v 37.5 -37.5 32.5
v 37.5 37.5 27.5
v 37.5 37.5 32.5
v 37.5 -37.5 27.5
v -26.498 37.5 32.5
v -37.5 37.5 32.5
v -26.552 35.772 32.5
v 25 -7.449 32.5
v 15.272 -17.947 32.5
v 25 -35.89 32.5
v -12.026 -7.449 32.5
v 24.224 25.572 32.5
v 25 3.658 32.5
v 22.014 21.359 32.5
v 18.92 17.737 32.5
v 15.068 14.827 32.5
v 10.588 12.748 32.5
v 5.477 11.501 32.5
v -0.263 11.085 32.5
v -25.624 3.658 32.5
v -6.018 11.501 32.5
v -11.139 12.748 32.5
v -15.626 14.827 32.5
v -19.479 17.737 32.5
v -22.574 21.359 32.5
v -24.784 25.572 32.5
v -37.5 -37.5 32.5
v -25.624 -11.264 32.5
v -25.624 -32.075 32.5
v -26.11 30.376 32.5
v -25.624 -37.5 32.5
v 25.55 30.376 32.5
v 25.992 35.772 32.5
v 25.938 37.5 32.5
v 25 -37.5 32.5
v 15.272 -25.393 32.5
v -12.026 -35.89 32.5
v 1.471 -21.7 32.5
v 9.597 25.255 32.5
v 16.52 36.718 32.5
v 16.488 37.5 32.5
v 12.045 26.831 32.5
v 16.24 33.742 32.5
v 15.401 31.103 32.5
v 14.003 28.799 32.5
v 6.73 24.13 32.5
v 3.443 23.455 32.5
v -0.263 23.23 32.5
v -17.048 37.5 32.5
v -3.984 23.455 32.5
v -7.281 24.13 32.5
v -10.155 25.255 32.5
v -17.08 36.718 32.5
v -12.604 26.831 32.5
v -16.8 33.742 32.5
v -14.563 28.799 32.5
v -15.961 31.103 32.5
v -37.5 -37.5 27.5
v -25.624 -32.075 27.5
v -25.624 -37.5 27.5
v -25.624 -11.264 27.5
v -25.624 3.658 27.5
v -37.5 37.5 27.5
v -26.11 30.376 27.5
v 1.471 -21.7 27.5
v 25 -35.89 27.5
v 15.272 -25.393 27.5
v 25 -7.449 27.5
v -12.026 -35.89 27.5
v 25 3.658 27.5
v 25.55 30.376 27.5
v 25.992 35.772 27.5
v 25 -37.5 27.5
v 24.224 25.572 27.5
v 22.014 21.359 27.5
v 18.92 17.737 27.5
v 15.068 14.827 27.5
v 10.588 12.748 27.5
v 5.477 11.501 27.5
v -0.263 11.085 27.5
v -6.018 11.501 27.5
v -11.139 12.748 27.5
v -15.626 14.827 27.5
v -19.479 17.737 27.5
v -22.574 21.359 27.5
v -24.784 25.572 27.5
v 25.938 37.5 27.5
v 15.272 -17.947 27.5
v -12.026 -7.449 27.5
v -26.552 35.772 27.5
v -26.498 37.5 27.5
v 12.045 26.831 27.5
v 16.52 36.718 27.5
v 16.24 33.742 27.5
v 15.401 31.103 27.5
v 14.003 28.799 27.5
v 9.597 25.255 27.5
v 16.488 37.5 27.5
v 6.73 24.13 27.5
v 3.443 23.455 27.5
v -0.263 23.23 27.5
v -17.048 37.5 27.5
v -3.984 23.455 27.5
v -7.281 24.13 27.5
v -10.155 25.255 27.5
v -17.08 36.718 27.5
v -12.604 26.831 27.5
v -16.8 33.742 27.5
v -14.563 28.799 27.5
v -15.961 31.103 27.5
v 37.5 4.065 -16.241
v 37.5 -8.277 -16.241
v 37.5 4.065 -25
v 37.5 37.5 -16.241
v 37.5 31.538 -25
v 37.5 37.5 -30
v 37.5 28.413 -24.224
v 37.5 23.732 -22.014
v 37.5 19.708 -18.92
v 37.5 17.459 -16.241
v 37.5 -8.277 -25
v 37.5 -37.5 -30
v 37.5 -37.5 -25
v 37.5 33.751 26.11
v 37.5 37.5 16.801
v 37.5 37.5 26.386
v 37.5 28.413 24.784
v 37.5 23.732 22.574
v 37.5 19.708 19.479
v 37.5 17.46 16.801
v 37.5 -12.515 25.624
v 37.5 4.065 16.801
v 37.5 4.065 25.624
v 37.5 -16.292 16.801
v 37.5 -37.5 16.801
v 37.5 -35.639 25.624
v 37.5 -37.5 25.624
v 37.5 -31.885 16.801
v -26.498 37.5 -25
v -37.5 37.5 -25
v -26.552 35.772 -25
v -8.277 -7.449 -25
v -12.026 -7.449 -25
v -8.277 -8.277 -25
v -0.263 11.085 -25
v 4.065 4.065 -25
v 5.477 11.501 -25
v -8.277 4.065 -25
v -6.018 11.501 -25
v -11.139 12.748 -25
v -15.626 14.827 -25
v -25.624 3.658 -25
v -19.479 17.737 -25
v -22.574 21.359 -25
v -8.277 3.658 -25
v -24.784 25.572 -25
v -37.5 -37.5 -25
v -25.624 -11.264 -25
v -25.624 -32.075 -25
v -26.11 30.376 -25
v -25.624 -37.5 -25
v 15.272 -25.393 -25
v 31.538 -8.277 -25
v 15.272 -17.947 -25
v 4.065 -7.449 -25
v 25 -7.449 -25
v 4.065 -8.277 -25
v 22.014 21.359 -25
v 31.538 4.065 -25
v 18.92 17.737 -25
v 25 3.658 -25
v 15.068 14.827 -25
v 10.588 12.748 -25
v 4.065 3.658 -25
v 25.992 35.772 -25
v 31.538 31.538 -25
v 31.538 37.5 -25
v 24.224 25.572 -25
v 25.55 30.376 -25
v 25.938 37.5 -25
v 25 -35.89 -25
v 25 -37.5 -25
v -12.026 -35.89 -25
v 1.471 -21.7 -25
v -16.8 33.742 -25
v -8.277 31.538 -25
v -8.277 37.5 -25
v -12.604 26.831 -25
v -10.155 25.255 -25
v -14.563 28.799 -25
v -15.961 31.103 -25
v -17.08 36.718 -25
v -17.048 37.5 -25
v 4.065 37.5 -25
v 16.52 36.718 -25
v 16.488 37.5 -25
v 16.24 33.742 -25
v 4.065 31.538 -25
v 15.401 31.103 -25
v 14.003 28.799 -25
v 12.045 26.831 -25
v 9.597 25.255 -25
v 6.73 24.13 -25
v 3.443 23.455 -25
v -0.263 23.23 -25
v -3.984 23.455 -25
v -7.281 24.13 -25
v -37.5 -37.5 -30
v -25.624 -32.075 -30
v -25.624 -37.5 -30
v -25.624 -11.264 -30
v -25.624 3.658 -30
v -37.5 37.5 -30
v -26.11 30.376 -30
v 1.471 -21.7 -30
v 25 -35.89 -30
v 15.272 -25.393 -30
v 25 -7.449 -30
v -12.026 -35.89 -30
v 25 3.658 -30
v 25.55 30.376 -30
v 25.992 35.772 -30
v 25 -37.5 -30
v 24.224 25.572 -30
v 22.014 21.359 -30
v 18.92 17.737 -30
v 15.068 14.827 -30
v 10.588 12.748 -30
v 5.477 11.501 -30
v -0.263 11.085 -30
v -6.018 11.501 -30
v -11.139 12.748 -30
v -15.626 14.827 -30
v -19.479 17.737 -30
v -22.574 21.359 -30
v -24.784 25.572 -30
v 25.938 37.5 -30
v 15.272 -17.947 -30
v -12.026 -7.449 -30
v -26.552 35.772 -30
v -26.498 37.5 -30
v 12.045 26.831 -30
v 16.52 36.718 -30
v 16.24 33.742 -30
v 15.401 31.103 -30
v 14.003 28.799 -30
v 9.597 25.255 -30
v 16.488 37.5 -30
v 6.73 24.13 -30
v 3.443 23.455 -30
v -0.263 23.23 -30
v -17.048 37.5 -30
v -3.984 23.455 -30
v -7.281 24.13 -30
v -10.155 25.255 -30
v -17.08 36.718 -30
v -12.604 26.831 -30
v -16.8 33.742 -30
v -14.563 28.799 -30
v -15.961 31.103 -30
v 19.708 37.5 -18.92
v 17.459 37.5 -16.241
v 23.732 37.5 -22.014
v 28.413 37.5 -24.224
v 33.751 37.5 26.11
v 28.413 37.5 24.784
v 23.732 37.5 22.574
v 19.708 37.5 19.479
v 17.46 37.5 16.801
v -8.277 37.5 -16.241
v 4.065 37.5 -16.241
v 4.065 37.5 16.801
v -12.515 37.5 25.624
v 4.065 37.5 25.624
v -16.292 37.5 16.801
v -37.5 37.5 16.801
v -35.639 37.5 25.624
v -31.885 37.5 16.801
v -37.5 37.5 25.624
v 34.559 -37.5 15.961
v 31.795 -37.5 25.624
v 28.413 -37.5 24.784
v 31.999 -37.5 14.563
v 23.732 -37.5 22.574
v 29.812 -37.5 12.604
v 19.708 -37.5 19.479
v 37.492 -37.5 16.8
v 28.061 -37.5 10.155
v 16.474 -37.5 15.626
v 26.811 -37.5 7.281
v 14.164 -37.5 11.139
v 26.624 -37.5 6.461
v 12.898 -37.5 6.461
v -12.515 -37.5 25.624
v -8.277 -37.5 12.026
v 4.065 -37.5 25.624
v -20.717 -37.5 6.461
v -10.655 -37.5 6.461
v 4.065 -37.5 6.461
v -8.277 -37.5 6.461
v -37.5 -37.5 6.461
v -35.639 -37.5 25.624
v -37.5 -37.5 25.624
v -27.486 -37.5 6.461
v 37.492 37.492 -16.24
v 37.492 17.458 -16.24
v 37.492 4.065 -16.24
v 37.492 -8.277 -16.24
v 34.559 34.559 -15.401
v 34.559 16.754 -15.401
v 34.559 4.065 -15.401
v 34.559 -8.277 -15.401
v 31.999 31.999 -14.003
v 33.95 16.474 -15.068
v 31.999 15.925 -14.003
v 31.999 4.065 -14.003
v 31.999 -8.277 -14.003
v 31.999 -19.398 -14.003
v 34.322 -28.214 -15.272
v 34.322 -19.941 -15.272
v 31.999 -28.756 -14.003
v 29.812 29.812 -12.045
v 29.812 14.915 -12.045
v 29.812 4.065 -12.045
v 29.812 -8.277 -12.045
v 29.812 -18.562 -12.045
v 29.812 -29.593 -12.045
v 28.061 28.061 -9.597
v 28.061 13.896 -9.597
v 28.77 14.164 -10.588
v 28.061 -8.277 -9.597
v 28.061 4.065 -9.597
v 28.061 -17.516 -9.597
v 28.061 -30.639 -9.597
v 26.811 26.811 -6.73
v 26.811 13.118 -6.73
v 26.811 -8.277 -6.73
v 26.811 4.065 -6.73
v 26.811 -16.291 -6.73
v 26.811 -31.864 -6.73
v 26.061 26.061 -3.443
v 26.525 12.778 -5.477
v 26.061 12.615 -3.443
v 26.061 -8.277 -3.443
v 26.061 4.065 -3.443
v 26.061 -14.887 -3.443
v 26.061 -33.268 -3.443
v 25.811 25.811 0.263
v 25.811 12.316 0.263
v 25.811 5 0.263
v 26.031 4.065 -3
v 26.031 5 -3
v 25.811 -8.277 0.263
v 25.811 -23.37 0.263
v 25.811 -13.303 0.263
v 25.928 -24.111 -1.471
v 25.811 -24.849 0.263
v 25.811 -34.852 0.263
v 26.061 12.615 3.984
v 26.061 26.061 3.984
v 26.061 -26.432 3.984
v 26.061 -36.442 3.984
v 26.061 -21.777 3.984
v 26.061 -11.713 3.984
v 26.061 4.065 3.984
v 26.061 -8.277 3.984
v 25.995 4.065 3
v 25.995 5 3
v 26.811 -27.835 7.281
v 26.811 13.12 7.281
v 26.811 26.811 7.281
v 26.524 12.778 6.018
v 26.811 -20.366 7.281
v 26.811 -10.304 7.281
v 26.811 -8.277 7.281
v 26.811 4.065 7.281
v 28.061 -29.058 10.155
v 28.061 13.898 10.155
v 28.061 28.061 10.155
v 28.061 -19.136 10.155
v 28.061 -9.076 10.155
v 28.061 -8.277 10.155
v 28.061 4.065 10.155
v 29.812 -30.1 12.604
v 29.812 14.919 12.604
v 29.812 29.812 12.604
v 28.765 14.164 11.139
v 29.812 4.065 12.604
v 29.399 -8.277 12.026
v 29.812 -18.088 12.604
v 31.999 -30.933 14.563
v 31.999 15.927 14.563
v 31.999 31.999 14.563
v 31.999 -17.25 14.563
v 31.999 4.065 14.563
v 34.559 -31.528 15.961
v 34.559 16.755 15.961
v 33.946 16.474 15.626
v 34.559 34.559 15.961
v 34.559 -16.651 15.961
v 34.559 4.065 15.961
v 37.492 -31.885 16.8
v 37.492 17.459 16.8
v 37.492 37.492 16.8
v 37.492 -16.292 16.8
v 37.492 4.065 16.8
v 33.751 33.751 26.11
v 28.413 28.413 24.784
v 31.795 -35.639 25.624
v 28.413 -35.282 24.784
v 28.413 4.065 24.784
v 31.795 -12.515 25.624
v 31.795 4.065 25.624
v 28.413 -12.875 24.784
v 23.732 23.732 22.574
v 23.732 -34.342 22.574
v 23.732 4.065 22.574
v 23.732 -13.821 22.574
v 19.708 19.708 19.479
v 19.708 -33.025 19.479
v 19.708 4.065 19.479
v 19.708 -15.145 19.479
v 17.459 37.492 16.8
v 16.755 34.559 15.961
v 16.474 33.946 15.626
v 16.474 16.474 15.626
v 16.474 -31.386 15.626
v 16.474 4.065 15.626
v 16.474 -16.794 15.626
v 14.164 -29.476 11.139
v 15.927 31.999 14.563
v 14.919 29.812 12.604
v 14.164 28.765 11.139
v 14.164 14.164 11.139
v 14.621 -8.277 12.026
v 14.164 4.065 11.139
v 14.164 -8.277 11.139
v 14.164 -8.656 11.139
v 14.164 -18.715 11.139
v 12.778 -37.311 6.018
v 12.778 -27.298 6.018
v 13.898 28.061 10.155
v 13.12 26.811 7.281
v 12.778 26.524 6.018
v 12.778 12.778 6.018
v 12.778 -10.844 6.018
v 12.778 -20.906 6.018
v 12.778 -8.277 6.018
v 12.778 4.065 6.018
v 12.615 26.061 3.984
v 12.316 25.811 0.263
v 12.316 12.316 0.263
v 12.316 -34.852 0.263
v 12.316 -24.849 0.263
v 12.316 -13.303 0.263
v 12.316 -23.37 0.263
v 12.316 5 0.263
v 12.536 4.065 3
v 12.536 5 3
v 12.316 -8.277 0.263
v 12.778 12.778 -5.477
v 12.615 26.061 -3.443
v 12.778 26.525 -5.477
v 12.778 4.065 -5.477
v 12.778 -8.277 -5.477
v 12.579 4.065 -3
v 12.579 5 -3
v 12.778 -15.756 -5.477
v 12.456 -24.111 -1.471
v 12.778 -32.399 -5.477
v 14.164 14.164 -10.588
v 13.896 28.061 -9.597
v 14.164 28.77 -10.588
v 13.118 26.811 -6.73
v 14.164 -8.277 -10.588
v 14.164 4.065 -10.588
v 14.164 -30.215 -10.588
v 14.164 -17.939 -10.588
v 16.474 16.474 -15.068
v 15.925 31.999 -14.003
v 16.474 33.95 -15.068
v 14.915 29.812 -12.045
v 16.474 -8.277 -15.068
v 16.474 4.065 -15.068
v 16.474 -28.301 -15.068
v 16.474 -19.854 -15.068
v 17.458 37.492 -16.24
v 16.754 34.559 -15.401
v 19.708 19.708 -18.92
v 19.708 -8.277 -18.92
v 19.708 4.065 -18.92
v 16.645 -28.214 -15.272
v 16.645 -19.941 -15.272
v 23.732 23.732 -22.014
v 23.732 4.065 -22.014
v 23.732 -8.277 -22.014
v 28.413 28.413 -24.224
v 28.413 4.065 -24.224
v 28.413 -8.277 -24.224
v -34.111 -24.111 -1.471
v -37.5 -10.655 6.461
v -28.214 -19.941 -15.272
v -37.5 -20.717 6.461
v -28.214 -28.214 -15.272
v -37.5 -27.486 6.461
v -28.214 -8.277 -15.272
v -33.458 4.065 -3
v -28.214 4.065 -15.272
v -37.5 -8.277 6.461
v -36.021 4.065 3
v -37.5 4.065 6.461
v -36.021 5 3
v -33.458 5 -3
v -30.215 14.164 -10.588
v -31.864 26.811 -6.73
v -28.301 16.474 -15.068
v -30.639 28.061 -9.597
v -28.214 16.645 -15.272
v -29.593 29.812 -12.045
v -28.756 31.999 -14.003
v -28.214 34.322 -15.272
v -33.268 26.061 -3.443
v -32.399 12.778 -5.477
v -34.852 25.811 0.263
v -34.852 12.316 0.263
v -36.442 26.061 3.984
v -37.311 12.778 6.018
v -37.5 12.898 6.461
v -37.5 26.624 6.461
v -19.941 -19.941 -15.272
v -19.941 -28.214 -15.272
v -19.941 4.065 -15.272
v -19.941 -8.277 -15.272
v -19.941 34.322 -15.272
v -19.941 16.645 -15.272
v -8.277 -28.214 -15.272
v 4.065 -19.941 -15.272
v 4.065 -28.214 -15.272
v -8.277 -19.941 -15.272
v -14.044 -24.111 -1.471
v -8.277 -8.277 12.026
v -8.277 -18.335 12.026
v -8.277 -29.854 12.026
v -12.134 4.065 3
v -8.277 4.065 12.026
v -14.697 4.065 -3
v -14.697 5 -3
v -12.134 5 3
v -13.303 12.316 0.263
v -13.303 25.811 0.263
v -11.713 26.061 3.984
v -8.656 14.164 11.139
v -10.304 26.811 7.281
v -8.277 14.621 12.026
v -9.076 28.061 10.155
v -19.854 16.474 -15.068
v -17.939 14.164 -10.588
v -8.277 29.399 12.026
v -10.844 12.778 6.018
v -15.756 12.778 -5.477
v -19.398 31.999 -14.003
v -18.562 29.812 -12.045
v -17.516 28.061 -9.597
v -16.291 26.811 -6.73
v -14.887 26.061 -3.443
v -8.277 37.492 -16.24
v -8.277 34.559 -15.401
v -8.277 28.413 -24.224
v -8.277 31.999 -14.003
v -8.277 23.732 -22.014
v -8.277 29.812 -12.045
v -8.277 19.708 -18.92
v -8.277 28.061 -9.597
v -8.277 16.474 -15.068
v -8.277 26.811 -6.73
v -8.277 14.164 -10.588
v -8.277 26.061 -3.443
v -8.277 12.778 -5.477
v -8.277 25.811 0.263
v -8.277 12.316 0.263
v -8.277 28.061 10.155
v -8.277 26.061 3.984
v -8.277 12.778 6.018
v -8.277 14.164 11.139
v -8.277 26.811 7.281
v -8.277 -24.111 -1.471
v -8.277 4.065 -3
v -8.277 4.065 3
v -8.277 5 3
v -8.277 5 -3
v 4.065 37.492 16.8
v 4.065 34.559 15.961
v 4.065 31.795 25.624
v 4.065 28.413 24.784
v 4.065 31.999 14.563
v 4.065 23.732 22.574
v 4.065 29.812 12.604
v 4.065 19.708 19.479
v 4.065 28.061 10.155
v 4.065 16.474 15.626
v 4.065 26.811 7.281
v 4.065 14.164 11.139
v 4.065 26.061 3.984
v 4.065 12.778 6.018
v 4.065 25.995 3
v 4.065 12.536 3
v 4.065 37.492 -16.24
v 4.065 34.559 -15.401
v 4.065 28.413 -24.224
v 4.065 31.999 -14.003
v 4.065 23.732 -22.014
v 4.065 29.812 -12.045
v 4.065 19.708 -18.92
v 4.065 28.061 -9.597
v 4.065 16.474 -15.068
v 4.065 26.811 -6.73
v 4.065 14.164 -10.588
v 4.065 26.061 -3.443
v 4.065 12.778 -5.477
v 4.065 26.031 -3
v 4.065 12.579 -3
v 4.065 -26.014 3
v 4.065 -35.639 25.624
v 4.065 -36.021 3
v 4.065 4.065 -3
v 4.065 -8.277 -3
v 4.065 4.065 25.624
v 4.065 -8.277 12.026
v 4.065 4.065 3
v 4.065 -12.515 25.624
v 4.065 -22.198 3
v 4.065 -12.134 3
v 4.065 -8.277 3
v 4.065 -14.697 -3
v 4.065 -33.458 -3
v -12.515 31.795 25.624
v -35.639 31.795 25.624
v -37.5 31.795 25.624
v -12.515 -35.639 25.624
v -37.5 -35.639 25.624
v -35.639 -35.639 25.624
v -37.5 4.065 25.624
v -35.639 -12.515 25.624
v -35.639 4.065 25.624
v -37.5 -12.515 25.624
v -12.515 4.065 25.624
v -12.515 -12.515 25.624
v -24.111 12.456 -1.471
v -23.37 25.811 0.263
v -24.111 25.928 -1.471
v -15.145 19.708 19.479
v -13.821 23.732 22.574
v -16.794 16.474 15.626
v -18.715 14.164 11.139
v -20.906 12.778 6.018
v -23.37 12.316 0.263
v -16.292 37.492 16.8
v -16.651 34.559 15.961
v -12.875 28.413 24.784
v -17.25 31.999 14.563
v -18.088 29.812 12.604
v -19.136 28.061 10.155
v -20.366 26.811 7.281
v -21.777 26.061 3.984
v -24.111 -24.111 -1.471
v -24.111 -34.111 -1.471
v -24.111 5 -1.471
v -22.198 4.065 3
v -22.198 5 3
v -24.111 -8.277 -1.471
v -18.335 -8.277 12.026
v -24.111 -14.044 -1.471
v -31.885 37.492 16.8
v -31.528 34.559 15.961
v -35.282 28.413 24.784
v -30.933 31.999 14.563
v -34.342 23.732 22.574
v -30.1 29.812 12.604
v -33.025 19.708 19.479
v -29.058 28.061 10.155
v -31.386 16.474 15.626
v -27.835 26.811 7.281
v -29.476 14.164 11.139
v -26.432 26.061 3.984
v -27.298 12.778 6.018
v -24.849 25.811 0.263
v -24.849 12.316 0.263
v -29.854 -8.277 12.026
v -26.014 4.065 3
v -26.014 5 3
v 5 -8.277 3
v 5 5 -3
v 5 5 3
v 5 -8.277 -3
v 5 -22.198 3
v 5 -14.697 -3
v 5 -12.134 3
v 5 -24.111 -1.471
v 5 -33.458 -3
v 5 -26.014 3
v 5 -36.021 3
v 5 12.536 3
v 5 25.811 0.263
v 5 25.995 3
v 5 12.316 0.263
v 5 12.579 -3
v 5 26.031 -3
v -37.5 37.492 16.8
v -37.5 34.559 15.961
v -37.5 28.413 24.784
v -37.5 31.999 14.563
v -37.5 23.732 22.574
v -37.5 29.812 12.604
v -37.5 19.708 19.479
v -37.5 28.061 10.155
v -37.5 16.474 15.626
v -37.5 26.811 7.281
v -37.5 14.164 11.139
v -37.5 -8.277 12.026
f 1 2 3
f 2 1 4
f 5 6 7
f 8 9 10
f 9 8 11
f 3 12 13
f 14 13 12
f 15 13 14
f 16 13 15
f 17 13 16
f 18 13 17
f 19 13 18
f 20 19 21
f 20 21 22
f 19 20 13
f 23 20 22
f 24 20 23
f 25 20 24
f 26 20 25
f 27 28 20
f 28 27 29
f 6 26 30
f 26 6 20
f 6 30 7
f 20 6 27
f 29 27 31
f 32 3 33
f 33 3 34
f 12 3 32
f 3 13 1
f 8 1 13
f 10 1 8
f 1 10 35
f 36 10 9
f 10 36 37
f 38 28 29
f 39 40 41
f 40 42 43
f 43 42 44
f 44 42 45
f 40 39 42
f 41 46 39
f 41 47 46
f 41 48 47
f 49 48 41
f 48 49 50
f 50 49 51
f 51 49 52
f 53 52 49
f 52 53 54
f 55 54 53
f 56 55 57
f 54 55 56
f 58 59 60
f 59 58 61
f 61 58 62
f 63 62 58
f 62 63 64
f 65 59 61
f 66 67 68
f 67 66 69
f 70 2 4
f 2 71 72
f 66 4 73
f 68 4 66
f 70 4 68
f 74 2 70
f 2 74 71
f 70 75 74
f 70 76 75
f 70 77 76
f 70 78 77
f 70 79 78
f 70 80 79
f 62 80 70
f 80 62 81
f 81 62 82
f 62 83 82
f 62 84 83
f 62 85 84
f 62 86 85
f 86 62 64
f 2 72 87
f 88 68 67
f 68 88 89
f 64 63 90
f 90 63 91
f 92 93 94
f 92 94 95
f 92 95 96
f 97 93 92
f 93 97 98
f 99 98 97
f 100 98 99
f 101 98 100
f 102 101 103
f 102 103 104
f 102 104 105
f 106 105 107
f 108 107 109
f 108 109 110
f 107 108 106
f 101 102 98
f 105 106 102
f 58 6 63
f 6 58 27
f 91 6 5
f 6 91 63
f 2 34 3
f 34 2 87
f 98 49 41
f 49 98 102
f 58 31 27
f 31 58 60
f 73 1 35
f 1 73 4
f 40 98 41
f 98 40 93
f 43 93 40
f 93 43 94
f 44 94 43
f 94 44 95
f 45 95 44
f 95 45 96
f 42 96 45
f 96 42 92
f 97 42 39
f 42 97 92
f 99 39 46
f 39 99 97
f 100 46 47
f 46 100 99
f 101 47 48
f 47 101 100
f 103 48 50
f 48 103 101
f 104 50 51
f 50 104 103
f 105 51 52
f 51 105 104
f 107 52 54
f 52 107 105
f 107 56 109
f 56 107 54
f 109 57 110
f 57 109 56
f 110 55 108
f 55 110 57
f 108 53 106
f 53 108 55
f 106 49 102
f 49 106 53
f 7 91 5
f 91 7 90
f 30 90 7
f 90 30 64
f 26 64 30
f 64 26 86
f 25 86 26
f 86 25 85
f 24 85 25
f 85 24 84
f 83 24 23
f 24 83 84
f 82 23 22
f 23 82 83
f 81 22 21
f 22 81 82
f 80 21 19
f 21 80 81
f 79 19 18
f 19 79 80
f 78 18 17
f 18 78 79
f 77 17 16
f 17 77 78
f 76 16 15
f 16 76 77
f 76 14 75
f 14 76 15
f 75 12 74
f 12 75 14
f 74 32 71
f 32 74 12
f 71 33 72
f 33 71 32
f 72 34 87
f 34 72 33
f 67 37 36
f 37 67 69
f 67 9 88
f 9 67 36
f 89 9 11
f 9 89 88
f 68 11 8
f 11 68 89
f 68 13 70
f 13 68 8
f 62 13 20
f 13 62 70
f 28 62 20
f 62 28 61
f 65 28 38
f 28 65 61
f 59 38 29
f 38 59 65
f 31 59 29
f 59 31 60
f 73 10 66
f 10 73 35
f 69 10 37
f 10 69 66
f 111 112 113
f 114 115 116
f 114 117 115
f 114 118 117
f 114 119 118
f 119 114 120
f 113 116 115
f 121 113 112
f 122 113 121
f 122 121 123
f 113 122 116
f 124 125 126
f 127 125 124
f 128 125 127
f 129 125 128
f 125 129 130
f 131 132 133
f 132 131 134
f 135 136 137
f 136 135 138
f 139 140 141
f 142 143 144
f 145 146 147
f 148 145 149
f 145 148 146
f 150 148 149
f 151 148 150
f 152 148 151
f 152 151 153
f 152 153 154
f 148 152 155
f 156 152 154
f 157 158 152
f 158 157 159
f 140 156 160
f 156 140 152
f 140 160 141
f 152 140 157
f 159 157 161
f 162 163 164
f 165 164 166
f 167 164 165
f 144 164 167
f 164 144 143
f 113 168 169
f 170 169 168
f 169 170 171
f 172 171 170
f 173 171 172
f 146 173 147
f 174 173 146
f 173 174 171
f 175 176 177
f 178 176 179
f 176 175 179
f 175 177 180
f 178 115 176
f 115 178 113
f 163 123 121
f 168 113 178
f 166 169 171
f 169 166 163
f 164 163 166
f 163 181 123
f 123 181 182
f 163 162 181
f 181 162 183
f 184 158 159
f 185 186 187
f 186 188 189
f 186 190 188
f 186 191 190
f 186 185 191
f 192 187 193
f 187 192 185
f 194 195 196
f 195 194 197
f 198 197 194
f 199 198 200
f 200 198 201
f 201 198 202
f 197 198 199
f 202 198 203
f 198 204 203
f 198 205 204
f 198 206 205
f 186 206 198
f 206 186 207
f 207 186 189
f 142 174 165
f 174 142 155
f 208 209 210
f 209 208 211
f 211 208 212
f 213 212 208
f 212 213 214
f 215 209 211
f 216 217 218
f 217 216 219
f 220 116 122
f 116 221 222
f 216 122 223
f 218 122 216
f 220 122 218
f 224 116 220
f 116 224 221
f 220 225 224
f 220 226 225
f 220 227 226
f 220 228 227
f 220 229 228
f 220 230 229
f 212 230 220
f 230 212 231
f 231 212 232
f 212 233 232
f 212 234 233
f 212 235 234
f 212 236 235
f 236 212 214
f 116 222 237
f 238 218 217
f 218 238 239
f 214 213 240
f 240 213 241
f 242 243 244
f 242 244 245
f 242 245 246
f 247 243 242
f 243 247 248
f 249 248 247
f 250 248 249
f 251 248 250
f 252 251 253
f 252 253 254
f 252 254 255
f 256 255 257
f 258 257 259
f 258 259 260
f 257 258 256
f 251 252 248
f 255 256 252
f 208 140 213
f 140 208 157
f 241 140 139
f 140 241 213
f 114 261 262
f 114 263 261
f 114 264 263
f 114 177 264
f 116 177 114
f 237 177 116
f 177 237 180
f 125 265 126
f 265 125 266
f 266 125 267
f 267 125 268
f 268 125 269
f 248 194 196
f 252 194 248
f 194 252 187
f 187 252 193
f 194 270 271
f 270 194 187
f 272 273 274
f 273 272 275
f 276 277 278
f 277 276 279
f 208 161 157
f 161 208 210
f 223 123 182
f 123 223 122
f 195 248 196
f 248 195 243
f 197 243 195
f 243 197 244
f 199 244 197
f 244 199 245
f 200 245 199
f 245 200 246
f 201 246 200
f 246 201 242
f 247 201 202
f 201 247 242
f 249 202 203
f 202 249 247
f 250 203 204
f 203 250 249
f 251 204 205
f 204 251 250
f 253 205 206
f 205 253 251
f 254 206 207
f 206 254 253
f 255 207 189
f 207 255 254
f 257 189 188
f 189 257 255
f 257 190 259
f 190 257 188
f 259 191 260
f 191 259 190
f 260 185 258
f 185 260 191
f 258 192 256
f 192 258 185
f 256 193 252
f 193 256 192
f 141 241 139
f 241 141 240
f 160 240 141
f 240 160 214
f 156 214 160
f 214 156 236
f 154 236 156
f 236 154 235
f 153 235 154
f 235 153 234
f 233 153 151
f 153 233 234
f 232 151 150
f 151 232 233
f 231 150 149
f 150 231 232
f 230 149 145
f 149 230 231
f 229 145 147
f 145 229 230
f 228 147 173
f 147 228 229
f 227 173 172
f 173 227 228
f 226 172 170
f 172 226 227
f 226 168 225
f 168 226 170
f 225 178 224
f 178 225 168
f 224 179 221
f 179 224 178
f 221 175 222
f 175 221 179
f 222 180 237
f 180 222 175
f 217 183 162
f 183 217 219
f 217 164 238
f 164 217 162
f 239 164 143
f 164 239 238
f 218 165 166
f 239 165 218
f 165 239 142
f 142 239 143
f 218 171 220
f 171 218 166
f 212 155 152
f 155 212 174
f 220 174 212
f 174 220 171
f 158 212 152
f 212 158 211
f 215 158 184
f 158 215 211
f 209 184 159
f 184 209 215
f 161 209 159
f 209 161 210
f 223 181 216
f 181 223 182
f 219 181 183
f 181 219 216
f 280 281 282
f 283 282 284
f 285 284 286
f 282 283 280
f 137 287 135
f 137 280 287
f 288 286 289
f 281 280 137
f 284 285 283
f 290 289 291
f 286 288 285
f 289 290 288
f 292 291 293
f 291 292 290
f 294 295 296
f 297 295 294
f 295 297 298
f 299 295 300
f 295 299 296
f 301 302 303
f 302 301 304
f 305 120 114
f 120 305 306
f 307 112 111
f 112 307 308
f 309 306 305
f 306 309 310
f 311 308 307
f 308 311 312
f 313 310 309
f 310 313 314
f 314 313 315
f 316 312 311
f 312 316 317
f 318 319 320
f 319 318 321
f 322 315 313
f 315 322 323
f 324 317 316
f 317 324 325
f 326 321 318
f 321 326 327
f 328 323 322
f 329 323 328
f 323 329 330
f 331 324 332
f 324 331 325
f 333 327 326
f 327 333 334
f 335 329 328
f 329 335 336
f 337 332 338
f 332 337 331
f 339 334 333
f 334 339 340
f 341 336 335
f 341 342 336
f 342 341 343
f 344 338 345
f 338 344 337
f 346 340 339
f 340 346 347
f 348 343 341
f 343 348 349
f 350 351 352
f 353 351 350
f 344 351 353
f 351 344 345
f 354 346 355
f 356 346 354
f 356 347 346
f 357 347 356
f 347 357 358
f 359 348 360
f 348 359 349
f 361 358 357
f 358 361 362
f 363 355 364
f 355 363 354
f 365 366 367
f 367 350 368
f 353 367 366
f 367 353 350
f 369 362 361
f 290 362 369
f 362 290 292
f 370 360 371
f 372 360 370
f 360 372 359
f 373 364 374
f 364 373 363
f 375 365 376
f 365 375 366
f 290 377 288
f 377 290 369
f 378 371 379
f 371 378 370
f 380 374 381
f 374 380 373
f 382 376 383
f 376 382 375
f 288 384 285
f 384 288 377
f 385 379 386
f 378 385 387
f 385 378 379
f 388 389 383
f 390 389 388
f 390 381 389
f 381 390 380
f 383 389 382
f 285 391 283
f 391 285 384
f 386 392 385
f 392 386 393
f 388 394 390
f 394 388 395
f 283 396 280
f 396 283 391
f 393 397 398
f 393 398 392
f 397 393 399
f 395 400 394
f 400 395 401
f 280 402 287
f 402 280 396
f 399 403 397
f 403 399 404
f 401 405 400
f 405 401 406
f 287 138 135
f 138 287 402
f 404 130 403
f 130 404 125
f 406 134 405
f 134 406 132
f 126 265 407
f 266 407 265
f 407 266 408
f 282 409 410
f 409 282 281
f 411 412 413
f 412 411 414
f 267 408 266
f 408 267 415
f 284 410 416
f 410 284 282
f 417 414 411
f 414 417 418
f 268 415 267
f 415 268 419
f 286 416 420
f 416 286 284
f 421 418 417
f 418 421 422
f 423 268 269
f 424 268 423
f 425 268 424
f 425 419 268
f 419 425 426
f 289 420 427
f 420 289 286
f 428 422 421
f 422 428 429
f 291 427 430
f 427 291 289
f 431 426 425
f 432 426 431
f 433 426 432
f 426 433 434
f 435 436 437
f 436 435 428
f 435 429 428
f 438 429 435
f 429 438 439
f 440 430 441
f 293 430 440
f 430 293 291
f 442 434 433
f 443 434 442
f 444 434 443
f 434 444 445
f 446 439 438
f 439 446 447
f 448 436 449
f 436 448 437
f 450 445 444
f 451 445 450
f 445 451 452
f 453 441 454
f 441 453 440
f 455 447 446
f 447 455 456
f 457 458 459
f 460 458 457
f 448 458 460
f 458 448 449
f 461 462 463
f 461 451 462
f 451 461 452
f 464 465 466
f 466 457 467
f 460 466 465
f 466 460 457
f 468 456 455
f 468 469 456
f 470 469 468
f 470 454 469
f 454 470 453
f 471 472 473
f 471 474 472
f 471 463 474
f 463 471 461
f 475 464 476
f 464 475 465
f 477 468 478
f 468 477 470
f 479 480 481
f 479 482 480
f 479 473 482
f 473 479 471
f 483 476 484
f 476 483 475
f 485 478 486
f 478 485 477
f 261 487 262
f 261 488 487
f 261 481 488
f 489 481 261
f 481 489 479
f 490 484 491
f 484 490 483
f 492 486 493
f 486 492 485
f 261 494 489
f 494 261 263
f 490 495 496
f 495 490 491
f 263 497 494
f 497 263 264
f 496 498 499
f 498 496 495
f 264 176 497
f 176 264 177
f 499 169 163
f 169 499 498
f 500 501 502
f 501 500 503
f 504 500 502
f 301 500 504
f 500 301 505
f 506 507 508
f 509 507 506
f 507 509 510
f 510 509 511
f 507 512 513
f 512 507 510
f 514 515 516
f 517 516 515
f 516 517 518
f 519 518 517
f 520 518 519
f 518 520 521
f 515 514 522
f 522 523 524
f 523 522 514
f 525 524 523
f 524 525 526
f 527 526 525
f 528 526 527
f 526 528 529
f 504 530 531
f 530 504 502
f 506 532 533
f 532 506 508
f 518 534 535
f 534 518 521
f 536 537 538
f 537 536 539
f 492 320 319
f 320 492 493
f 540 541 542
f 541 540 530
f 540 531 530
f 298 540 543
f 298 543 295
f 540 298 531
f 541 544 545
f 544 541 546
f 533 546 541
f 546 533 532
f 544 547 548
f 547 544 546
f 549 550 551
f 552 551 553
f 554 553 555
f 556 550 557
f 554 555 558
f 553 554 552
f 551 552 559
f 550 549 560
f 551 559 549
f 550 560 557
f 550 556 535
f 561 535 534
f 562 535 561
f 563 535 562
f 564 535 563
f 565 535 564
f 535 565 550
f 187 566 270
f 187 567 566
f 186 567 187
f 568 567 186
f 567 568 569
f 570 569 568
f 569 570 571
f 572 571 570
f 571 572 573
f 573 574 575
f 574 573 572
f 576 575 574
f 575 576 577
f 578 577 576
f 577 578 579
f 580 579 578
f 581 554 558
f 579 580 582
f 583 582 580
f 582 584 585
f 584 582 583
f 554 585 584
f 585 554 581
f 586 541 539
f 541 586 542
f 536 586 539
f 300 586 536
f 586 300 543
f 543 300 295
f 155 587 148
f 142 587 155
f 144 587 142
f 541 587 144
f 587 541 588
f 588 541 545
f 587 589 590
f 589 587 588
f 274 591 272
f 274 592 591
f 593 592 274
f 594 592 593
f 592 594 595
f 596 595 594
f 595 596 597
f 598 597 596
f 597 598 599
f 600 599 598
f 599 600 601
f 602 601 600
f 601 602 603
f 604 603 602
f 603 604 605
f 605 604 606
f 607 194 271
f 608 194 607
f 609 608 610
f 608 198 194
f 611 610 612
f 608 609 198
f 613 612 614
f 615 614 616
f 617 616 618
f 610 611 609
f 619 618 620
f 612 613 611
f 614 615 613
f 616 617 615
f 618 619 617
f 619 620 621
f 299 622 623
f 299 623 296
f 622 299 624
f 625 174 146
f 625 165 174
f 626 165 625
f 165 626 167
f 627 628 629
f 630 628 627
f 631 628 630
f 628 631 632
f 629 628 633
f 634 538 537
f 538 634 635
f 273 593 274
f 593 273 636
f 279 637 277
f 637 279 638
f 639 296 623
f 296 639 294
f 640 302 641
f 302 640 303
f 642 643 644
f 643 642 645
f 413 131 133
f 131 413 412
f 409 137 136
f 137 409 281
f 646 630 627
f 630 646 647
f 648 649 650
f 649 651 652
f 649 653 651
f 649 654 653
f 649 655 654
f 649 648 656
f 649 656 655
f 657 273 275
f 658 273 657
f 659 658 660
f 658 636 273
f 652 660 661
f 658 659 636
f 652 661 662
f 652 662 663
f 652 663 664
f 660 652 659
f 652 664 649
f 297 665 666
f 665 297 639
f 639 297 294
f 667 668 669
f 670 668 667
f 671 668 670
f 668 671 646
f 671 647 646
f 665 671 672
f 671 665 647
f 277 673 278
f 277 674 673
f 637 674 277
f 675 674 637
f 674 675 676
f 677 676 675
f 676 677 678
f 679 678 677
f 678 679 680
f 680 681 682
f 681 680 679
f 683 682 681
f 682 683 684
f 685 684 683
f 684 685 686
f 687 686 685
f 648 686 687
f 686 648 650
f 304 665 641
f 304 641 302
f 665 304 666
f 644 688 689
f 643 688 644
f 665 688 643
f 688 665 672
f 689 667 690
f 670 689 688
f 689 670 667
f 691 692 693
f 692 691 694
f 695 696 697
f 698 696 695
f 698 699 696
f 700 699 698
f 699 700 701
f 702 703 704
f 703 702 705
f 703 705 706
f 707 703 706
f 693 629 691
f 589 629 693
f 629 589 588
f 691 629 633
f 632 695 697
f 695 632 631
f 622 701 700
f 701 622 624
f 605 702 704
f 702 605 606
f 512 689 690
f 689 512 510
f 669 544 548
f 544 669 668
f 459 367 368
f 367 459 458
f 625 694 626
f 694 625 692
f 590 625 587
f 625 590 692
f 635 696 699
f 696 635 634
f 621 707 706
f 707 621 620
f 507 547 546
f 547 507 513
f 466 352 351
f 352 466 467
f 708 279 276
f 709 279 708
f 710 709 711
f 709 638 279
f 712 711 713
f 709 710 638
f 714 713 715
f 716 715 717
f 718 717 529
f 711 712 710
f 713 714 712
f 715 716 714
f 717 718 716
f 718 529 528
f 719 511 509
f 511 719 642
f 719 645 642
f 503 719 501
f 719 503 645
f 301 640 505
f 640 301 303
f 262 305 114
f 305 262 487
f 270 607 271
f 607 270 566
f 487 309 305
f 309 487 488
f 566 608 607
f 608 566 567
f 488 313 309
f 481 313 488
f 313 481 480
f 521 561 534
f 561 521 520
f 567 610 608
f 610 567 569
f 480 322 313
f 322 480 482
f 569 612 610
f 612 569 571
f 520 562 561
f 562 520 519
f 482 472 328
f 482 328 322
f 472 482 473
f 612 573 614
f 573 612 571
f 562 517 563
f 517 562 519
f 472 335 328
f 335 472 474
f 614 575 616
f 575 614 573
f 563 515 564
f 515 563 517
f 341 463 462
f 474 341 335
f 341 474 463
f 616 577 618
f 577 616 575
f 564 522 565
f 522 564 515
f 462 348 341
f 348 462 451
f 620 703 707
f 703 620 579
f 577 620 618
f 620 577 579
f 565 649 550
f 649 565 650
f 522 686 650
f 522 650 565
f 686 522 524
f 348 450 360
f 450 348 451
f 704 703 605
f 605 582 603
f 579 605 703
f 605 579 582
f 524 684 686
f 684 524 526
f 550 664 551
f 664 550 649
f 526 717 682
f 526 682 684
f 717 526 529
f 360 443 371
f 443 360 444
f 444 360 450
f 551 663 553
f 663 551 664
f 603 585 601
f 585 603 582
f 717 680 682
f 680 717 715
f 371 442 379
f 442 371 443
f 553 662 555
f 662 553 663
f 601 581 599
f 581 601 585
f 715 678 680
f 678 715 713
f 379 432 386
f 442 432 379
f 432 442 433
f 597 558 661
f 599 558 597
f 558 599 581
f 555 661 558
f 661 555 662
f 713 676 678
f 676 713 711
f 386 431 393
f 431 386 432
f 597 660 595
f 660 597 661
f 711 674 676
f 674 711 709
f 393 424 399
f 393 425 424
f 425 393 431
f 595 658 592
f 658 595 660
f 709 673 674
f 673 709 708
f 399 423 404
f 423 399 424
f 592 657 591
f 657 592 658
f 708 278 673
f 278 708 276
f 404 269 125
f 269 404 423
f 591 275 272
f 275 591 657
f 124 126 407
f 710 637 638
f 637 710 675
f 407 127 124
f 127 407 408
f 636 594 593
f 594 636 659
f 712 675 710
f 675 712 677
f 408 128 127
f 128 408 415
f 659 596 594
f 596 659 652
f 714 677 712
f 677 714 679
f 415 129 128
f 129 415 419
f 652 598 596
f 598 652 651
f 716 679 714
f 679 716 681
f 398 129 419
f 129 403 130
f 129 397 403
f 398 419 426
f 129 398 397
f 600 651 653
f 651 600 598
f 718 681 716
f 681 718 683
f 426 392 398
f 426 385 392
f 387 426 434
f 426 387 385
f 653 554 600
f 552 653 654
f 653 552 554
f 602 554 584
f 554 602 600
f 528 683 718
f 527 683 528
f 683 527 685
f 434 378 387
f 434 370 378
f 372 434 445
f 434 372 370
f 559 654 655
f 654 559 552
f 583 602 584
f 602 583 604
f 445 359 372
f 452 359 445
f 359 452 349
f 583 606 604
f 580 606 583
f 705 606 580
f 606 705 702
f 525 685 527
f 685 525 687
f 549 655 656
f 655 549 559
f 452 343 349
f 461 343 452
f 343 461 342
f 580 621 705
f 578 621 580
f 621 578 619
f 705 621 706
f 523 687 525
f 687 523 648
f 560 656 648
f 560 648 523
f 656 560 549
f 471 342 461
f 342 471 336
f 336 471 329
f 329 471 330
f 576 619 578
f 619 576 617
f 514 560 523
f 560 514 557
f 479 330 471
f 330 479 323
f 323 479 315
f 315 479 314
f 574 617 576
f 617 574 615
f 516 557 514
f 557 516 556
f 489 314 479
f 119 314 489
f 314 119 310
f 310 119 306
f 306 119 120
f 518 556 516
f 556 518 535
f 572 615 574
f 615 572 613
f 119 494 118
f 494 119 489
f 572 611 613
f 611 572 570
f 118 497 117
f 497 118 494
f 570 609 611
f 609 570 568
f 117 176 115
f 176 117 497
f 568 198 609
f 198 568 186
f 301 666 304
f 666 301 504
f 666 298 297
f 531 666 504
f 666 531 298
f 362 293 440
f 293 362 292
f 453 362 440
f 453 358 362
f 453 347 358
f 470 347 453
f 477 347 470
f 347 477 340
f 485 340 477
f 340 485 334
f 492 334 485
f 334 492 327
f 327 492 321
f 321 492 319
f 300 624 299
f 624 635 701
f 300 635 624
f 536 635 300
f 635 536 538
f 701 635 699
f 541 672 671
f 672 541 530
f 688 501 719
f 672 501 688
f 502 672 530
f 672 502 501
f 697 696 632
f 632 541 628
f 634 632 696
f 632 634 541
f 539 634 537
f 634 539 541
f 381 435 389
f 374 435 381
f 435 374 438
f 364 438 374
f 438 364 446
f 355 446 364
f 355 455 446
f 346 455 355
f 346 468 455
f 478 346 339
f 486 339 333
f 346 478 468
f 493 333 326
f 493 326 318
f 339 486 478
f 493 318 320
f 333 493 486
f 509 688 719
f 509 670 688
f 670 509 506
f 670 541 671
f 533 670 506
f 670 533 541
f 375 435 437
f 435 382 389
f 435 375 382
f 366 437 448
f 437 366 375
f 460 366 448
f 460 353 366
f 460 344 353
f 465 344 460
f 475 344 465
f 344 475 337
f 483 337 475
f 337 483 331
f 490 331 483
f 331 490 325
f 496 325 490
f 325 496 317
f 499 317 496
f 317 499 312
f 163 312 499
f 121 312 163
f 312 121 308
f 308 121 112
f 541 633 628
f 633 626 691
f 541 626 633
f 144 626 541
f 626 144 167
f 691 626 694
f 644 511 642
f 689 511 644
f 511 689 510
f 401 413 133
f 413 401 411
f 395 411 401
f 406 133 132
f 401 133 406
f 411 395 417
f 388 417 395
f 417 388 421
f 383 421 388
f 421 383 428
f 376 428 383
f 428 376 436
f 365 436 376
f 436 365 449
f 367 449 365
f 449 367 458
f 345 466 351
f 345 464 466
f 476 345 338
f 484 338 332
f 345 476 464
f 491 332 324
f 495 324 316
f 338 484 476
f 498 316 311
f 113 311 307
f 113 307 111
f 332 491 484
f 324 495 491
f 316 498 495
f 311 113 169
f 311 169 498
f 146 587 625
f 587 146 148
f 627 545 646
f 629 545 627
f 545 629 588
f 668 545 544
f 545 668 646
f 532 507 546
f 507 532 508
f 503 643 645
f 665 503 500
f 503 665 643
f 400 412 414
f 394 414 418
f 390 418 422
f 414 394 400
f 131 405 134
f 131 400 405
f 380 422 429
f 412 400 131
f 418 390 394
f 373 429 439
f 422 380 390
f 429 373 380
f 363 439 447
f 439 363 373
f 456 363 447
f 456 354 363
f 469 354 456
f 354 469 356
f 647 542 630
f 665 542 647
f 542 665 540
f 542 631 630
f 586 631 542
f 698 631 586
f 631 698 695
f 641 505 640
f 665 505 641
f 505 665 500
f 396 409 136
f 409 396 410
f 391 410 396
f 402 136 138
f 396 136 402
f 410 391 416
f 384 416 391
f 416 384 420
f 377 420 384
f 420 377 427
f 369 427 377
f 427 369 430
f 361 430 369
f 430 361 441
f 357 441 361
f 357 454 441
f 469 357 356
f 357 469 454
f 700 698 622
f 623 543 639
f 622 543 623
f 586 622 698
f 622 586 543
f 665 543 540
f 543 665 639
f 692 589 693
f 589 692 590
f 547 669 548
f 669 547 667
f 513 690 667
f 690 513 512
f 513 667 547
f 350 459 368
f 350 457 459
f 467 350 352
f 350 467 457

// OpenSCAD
font = "Monaco:style=Bold";

floor_height = 5;
font_height = 50;

module emblem_cube(emblem_text_x, emblem_text_y, emblem_text_z,
        font_height, emblem_x, emblem_y, emblem_z,
        z_text_scale) {
    filler_cube_z = 6;
   
    module z_text() {
        scale(z_text_scale)
        rotate([0, 0, 90])
        translate([0, -font_height / 2, 0])
            linear_extrude(emblem_z)
                text(emblem_text_z, font_height, halign="center", font=font);
    }
    module v1_plate() {
        
        difference() {
            translate([-emblem_x / 2, -emblem_y / 2, emblem_z / 2])
                cube([emblem_x, emblem_y, floor_height]);
            translate([0, 0, 0])
                z_text();
        }
    }
    
    translate([0, 0, 0]) v1_plate();
    translate([0, 0, -emblem_z - floor_height / 2]) v1_plate();
   
    intersection() {
        union() {
            translate([0, emblem_y / 2, 0])
            rotate([90, 0, 0])
                translate([0, -font_height / 2, 0])
                linear_extrude(emblem_y)
                    text(emblem_text_x, font_height, halign="center", font=font);
            # translate([-1, -emblem_y / 2, -filler_cube_z / 2])
            cube([filler_cube_z, emblem_y, filler_cube_z]);
        }
        union() {
            translate([-emblem_x / 2, 0, 0])
                rotate([90, 0, 90])
                translate([0, -font_height / 2, 0])
                linear_extrude(emblem_y)
                    text(emblem_text_y, font_height, halign="center", font=font);
            # translate([-emblem_x / 2, -1, -filler_cube_z / 2])
            cube([emblem_x, filler_cube_z, filler_cube_z]);
        }
    }
}

module mc_api_v1() {
    emblem_z = font_height + floor_height;
    z_text_scale = [1.2, 1.3, 1];
    emblem_text_x = "MC";
    emblem_text_y = "API";
    emblem_text_z = "V1";
    emblem_x = 75;
    emblem_y = 118;
    emblem_cube(
        emblem_text_x, emblem_text_y, emblem_text_z,
        font_height, emblem_x, emblem_y, emblem_z,
        z_text_scale);
}

module emblem_cube_sq(emblem_text, font_height) {
    filler_cube_z = 6;
   
    emblem_z = font_height + floor_height;
    z_text_scale = [1, 0.9, 1];
    emblem_text_x = emblem_text;
    emblem_text_y = emblem_text;
    emblem_text_z = emblem_text;
    emblem_x = 1.5 * font_height;
    emblem_y = 1.5 * font_height;
   
    emblem_cube(
        emblem_text_x, emblem_text_y, emblem_text_z,
        font_height, emblem_x, emblem_y, emblem_z,
        z_text_scale);
}

module mc_mc_mc() {
    emblem_text = "MC";
    emblem_cube_sq(emblem_text, font_height);
}

rotate([0, -90, 0]) 
!    mc_mc_mc();


% translate([100, 100, 0]) 
    rotate([0, -90, 0]) 
        mc_api_v1();
